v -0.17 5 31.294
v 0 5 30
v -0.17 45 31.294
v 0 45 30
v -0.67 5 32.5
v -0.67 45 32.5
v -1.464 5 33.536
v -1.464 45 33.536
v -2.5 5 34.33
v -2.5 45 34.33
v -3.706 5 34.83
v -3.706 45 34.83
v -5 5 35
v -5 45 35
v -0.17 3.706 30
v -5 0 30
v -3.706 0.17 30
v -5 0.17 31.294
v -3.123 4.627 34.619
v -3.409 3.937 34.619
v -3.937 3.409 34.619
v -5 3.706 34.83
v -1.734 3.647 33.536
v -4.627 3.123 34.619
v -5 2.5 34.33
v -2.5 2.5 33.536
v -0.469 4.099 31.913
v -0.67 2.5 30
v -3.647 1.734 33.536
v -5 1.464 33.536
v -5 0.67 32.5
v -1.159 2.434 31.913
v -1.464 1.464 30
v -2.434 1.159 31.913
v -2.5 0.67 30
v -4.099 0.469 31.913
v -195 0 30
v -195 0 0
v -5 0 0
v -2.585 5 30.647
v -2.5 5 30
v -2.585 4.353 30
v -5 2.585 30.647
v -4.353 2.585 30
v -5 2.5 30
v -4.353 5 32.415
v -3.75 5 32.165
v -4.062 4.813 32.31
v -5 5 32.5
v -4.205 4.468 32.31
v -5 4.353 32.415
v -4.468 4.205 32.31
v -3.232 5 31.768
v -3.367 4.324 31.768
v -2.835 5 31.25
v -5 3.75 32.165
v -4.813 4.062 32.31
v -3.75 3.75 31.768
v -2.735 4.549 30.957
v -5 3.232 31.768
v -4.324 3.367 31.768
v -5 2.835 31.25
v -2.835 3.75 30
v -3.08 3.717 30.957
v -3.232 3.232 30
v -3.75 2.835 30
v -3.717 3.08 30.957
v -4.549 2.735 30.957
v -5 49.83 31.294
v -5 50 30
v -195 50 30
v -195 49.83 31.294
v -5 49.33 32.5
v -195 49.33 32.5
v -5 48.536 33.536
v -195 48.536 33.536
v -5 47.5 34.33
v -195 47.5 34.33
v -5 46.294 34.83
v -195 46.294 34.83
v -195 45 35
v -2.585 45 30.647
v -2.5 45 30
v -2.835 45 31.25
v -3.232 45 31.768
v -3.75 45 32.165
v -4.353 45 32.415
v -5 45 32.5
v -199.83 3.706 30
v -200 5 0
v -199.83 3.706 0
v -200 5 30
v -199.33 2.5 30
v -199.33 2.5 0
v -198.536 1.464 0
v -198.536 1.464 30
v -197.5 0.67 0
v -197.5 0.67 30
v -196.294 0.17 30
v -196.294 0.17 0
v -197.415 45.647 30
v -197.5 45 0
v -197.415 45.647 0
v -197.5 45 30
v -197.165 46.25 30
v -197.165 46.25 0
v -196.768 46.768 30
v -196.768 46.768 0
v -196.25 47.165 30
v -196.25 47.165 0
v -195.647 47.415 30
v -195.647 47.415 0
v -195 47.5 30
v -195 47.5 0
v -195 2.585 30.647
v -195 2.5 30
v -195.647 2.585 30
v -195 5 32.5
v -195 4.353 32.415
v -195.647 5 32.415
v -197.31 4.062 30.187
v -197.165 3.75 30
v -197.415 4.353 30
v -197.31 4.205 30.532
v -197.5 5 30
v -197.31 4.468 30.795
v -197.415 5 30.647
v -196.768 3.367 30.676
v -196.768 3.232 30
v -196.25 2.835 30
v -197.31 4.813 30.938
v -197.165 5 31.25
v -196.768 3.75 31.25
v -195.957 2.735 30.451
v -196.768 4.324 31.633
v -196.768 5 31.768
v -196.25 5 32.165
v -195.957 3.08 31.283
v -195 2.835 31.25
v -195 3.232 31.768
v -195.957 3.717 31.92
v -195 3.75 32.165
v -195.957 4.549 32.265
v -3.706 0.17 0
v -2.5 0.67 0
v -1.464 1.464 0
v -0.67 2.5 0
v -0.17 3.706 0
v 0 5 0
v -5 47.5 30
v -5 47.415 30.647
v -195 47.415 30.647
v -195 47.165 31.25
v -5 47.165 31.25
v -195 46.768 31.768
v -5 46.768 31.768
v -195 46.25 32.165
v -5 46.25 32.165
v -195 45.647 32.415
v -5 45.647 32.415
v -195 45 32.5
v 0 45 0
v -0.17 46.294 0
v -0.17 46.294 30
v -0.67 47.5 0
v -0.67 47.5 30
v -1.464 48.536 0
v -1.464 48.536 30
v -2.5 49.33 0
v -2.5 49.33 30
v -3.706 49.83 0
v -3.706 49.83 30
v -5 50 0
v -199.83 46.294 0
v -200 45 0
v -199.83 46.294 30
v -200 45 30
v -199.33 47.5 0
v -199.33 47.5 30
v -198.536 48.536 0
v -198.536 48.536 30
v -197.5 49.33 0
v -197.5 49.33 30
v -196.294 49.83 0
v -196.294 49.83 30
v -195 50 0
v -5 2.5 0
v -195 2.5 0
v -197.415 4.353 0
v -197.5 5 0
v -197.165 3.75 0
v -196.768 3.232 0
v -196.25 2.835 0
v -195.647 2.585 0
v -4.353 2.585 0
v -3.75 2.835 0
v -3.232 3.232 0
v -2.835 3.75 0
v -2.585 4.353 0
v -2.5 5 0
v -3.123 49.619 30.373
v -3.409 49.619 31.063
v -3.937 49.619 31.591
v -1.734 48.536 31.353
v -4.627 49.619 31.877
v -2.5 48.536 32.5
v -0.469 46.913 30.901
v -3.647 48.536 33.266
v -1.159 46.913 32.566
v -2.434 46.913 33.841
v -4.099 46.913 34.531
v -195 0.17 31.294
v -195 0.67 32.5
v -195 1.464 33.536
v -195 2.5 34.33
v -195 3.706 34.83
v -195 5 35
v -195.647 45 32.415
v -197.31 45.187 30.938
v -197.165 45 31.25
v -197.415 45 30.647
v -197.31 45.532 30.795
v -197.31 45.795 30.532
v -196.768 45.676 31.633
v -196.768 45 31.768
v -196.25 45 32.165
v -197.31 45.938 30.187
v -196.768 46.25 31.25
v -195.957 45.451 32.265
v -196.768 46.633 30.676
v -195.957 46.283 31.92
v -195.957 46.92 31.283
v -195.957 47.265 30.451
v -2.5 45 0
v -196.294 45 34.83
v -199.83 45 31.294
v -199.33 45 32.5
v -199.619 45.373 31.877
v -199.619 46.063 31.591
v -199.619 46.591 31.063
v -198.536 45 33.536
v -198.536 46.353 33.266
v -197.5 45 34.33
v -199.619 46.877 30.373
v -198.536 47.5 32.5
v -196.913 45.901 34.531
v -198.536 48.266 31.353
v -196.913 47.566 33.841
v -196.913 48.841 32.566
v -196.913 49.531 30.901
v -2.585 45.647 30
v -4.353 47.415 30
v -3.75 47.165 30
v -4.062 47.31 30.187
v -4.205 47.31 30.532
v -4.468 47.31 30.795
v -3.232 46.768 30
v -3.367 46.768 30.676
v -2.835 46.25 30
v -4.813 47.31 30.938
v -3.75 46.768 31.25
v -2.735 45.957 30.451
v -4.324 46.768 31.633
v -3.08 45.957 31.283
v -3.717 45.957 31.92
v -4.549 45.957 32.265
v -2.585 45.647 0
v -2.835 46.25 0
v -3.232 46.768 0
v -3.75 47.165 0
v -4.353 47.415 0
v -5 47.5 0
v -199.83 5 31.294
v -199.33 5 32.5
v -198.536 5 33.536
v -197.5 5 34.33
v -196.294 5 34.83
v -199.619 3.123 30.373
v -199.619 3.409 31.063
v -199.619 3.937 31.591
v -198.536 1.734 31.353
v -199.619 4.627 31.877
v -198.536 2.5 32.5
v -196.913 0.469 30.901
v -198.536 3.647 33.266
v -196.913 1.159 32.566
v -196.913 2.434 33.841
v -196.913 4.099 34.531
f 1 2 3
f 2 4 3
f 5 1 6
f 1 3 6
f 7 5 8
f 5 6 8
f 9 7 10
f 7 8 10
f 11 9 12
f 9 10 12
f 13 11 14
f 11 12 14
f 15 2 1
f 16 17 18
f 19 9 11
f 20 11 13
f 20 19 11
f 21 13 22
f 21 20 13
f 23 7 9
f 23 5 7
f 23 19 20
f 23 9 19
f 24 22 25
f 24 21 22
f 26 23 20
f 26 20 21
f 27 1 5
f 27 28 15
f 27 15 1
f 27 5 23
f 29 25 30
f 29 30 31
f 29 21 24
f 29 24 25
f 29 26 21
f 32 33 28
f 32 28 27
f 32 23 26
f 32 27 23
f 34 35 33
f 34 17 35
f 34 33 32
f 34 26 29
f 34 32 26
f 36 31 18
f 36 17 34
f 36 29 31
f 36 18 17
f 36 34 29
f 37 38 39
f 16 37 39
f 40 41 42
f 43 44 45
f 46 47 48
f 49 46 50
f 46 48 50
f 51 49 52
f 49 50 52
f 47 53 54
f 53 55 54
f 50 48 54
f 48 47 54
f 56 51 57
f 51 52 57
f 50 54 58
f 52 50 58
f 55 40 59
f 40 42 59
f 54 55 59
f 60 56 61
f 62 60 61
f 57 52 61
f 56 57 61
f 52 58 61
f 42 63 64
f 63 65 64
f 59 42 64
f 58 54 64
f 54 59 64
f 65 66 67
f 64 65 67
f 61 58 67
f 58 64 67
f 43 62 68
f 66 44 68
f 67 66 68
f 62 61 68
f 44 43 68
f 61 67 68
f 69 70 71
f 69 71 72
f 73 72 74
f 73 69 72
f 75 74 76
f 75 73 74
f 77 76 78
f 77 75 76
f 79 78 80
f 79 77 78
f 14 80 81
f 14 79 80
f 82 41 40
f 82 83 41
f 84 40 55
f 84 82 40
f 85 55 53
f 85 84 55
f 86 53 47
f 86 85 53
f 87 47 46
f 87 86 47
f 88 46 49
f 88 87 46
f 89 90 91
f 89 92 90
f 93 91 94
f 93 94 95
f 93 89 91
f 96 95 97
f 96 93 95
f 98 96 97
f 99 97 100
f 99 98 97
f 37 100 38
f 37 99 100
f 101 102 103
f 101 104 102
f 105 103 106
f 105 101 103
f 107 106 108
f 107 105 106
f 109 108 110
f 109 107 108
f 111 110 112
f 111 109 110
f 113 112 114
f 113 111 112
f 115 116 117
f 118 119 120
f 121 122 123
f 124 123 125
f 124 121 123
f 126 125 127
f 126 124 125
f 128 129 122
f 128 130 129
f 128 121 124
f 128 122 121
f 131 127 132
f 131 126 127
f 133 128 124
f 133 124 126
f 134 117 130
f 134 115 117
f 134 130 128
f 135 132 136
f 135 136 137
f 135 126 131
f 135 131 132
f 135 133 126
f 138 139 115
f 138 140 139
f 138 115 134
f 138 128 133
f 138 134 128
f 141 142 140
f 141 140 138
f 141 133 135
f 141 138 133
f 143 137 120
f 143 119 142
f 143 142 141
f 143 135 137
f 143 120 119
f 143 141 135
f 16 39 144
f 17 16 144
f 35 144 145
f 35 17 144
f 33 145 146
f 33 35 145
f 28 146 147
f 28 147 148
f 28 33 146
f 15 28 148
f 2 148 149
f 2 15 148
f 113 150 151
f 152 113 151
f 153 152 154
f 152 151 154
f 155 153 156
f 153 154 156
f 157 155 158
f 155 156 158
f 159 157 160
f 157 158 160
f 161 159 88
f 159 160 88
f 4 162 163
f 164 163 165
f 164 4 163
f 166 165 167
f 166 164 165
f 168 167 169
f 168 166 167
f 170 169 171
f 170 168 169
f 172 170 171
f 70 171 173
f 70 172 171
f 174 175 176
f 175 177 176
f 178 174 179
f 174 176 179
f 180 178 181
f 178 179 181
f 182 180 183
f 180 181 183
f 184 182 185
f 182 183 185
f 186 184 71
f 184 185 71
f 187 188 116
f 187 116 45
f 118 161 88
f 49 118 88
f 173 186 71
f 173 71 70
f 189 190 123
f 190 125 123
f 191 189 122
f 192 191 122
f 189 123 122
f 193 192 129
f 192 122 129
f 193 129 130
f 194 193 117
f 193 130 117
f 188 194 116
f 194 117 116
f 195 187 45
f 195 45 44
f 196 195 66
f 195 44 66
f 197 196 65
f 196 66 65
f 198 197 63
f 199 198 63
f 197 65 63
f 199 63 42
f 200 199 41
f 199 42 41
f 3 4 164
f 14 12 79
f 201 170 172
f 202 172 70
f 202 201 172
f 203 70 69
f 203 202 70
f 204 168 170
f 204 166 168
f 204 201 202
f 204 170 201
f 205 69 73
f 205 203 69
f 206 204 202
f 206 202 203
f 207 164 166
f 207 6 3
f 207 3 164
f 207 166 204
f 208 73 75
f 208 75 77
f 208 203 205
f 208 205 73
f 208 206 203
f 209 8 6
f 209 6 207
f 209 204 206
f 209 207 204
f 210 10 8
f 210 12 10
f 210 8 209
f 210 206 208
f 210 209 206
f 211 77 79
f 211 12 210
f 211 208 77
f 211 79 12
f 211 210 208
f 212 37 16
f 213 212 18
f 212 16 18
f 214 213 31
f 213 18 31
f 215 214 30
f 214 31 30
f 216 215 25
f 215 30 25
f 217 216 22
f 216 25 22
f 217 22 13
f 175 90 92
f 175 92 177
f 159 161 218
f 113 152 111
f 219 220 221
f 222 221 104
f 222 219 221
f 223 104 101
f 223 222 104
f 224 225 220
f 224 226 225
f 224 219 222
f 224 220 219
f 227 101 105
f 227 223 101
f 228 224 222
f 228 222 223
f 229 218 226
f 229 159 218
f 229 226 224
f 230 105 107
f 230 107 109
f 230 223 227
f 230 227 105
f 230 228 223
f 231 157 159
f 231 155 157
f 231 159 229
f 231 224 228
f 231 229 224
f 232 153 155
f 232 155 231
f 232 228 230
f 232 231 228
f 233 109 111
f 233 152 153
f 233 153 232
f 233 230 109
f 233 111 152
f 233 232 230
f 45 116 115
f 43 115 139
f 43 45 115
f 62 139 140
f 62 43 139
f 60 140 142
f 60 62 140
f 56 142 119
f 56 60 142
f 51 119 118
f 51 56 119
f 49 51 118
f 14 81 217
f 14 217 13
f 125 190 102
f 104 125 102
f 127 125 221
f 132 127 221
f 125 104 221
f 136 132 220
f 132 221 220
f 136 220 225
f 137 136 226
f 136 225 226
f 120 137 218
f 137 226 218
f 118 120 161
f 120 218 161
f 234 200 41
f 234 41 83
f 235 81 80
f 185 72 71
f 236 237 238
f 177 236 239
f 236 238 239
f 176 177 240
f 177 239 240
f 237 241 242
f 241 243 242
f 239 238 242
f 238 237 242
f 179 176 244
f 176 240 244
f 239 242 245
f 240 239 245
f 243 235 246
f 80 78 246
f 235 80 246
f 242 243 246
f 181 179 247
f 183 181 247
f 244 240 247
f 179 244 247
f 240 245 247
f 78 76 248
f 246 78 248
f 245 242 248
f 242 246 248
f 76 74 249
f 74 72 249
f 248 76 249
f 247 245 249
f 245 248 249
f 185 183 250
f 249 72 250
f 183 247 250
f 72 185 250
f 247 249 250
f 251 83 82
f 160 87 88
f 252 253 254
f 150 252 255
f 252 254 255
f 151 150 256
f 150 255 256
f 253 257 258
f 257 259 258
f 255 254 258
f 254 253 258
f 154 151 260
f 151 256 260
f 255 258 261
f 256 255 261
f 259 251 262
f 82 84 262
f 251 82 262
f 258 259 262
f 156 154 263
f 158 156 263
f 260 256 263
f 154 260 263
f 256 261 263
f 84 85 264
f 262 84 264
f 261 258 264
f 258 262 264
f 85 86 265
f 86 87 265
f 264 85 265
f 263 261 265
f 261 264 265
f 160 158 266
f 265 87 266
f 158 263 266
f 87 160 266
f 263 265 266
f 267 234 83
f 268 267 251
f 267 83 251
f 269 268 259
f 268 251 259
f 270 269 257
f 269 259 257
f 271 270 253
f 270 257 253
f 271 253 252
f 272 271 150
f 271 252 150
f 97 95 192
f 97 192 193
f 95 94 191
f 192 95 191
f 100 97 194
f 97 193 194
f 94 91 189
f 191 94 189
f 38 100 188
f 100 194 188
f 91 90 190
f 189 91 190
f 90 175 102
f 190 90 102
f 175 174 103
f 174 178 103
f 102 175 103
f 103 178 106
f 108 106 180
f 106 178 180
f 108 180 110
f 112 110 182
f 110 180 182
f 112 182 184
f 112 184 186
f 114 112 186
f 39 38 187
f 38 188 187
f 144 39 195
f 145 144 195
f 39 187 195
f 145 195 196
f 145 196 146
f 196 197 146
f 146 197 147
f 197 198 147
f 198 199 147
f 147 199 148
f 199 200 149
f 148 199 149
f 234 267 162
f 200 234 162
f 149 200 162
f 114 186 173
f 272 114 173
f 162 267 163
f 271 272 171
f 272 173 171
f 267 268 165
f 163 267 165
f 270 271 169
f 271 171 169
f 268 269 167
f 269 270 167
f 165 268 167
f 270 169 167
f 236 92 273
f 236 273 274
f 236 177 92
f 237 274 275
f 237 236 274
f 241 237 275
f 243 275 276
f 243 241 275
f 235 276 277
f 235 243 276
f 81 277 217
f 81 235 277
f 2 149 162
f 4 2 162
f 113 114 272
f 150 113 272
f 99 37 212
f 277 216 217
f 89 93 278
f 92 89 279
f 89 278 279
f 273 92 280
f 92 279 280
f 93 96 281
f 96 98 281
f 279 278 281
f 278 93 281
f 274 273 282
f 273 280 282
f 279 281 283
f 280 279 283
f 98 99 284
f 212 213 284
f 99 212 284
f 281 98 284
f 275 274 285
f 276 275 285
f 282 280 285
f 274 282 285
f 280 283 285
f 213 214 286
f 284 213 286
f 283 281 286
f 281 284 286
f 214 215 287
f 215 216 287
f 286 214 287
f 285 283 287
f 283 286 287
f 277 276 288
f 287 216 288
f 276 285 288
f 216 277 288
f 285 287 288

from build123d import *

# Parameters (mm, degrees)
F0_W     = 200
F0_H     = 50
F1_DEPTH = 35
F2_R     = 5
F3_T     = -2.5


with BuildPart() as f1:
    # F0 (on Top) → F1 (new body)
    with BuildSketch(Plane.XY):
        with Locations((-100, 25)):
            Rectangle(F0_W, F0_H)
    extrude(amount=F1_DEPTH)

    # F2
    f2_edges = [f1.edges().sort_by_distance(p)[0] for p in [
        (0, 0, 17.5),
        (0, 25, 35),
        (0, 50, 17.5),
        (-100, 50, 35),
        (-100, 0, 35),
        (-200, 0, 17.5),
        (-200, 25, 35),
        (-200, 50, 17.5),
    ]]
    fillet(f2_edges, radius=F2_R)

    # F3
    f3_openings = [f1.faces().sort_by_distance(p)[0] for p in [
        (-100, 25, 0),
    ]]
    offset(amount=F3_T, openings=f3_openings)


solid = f1.part
